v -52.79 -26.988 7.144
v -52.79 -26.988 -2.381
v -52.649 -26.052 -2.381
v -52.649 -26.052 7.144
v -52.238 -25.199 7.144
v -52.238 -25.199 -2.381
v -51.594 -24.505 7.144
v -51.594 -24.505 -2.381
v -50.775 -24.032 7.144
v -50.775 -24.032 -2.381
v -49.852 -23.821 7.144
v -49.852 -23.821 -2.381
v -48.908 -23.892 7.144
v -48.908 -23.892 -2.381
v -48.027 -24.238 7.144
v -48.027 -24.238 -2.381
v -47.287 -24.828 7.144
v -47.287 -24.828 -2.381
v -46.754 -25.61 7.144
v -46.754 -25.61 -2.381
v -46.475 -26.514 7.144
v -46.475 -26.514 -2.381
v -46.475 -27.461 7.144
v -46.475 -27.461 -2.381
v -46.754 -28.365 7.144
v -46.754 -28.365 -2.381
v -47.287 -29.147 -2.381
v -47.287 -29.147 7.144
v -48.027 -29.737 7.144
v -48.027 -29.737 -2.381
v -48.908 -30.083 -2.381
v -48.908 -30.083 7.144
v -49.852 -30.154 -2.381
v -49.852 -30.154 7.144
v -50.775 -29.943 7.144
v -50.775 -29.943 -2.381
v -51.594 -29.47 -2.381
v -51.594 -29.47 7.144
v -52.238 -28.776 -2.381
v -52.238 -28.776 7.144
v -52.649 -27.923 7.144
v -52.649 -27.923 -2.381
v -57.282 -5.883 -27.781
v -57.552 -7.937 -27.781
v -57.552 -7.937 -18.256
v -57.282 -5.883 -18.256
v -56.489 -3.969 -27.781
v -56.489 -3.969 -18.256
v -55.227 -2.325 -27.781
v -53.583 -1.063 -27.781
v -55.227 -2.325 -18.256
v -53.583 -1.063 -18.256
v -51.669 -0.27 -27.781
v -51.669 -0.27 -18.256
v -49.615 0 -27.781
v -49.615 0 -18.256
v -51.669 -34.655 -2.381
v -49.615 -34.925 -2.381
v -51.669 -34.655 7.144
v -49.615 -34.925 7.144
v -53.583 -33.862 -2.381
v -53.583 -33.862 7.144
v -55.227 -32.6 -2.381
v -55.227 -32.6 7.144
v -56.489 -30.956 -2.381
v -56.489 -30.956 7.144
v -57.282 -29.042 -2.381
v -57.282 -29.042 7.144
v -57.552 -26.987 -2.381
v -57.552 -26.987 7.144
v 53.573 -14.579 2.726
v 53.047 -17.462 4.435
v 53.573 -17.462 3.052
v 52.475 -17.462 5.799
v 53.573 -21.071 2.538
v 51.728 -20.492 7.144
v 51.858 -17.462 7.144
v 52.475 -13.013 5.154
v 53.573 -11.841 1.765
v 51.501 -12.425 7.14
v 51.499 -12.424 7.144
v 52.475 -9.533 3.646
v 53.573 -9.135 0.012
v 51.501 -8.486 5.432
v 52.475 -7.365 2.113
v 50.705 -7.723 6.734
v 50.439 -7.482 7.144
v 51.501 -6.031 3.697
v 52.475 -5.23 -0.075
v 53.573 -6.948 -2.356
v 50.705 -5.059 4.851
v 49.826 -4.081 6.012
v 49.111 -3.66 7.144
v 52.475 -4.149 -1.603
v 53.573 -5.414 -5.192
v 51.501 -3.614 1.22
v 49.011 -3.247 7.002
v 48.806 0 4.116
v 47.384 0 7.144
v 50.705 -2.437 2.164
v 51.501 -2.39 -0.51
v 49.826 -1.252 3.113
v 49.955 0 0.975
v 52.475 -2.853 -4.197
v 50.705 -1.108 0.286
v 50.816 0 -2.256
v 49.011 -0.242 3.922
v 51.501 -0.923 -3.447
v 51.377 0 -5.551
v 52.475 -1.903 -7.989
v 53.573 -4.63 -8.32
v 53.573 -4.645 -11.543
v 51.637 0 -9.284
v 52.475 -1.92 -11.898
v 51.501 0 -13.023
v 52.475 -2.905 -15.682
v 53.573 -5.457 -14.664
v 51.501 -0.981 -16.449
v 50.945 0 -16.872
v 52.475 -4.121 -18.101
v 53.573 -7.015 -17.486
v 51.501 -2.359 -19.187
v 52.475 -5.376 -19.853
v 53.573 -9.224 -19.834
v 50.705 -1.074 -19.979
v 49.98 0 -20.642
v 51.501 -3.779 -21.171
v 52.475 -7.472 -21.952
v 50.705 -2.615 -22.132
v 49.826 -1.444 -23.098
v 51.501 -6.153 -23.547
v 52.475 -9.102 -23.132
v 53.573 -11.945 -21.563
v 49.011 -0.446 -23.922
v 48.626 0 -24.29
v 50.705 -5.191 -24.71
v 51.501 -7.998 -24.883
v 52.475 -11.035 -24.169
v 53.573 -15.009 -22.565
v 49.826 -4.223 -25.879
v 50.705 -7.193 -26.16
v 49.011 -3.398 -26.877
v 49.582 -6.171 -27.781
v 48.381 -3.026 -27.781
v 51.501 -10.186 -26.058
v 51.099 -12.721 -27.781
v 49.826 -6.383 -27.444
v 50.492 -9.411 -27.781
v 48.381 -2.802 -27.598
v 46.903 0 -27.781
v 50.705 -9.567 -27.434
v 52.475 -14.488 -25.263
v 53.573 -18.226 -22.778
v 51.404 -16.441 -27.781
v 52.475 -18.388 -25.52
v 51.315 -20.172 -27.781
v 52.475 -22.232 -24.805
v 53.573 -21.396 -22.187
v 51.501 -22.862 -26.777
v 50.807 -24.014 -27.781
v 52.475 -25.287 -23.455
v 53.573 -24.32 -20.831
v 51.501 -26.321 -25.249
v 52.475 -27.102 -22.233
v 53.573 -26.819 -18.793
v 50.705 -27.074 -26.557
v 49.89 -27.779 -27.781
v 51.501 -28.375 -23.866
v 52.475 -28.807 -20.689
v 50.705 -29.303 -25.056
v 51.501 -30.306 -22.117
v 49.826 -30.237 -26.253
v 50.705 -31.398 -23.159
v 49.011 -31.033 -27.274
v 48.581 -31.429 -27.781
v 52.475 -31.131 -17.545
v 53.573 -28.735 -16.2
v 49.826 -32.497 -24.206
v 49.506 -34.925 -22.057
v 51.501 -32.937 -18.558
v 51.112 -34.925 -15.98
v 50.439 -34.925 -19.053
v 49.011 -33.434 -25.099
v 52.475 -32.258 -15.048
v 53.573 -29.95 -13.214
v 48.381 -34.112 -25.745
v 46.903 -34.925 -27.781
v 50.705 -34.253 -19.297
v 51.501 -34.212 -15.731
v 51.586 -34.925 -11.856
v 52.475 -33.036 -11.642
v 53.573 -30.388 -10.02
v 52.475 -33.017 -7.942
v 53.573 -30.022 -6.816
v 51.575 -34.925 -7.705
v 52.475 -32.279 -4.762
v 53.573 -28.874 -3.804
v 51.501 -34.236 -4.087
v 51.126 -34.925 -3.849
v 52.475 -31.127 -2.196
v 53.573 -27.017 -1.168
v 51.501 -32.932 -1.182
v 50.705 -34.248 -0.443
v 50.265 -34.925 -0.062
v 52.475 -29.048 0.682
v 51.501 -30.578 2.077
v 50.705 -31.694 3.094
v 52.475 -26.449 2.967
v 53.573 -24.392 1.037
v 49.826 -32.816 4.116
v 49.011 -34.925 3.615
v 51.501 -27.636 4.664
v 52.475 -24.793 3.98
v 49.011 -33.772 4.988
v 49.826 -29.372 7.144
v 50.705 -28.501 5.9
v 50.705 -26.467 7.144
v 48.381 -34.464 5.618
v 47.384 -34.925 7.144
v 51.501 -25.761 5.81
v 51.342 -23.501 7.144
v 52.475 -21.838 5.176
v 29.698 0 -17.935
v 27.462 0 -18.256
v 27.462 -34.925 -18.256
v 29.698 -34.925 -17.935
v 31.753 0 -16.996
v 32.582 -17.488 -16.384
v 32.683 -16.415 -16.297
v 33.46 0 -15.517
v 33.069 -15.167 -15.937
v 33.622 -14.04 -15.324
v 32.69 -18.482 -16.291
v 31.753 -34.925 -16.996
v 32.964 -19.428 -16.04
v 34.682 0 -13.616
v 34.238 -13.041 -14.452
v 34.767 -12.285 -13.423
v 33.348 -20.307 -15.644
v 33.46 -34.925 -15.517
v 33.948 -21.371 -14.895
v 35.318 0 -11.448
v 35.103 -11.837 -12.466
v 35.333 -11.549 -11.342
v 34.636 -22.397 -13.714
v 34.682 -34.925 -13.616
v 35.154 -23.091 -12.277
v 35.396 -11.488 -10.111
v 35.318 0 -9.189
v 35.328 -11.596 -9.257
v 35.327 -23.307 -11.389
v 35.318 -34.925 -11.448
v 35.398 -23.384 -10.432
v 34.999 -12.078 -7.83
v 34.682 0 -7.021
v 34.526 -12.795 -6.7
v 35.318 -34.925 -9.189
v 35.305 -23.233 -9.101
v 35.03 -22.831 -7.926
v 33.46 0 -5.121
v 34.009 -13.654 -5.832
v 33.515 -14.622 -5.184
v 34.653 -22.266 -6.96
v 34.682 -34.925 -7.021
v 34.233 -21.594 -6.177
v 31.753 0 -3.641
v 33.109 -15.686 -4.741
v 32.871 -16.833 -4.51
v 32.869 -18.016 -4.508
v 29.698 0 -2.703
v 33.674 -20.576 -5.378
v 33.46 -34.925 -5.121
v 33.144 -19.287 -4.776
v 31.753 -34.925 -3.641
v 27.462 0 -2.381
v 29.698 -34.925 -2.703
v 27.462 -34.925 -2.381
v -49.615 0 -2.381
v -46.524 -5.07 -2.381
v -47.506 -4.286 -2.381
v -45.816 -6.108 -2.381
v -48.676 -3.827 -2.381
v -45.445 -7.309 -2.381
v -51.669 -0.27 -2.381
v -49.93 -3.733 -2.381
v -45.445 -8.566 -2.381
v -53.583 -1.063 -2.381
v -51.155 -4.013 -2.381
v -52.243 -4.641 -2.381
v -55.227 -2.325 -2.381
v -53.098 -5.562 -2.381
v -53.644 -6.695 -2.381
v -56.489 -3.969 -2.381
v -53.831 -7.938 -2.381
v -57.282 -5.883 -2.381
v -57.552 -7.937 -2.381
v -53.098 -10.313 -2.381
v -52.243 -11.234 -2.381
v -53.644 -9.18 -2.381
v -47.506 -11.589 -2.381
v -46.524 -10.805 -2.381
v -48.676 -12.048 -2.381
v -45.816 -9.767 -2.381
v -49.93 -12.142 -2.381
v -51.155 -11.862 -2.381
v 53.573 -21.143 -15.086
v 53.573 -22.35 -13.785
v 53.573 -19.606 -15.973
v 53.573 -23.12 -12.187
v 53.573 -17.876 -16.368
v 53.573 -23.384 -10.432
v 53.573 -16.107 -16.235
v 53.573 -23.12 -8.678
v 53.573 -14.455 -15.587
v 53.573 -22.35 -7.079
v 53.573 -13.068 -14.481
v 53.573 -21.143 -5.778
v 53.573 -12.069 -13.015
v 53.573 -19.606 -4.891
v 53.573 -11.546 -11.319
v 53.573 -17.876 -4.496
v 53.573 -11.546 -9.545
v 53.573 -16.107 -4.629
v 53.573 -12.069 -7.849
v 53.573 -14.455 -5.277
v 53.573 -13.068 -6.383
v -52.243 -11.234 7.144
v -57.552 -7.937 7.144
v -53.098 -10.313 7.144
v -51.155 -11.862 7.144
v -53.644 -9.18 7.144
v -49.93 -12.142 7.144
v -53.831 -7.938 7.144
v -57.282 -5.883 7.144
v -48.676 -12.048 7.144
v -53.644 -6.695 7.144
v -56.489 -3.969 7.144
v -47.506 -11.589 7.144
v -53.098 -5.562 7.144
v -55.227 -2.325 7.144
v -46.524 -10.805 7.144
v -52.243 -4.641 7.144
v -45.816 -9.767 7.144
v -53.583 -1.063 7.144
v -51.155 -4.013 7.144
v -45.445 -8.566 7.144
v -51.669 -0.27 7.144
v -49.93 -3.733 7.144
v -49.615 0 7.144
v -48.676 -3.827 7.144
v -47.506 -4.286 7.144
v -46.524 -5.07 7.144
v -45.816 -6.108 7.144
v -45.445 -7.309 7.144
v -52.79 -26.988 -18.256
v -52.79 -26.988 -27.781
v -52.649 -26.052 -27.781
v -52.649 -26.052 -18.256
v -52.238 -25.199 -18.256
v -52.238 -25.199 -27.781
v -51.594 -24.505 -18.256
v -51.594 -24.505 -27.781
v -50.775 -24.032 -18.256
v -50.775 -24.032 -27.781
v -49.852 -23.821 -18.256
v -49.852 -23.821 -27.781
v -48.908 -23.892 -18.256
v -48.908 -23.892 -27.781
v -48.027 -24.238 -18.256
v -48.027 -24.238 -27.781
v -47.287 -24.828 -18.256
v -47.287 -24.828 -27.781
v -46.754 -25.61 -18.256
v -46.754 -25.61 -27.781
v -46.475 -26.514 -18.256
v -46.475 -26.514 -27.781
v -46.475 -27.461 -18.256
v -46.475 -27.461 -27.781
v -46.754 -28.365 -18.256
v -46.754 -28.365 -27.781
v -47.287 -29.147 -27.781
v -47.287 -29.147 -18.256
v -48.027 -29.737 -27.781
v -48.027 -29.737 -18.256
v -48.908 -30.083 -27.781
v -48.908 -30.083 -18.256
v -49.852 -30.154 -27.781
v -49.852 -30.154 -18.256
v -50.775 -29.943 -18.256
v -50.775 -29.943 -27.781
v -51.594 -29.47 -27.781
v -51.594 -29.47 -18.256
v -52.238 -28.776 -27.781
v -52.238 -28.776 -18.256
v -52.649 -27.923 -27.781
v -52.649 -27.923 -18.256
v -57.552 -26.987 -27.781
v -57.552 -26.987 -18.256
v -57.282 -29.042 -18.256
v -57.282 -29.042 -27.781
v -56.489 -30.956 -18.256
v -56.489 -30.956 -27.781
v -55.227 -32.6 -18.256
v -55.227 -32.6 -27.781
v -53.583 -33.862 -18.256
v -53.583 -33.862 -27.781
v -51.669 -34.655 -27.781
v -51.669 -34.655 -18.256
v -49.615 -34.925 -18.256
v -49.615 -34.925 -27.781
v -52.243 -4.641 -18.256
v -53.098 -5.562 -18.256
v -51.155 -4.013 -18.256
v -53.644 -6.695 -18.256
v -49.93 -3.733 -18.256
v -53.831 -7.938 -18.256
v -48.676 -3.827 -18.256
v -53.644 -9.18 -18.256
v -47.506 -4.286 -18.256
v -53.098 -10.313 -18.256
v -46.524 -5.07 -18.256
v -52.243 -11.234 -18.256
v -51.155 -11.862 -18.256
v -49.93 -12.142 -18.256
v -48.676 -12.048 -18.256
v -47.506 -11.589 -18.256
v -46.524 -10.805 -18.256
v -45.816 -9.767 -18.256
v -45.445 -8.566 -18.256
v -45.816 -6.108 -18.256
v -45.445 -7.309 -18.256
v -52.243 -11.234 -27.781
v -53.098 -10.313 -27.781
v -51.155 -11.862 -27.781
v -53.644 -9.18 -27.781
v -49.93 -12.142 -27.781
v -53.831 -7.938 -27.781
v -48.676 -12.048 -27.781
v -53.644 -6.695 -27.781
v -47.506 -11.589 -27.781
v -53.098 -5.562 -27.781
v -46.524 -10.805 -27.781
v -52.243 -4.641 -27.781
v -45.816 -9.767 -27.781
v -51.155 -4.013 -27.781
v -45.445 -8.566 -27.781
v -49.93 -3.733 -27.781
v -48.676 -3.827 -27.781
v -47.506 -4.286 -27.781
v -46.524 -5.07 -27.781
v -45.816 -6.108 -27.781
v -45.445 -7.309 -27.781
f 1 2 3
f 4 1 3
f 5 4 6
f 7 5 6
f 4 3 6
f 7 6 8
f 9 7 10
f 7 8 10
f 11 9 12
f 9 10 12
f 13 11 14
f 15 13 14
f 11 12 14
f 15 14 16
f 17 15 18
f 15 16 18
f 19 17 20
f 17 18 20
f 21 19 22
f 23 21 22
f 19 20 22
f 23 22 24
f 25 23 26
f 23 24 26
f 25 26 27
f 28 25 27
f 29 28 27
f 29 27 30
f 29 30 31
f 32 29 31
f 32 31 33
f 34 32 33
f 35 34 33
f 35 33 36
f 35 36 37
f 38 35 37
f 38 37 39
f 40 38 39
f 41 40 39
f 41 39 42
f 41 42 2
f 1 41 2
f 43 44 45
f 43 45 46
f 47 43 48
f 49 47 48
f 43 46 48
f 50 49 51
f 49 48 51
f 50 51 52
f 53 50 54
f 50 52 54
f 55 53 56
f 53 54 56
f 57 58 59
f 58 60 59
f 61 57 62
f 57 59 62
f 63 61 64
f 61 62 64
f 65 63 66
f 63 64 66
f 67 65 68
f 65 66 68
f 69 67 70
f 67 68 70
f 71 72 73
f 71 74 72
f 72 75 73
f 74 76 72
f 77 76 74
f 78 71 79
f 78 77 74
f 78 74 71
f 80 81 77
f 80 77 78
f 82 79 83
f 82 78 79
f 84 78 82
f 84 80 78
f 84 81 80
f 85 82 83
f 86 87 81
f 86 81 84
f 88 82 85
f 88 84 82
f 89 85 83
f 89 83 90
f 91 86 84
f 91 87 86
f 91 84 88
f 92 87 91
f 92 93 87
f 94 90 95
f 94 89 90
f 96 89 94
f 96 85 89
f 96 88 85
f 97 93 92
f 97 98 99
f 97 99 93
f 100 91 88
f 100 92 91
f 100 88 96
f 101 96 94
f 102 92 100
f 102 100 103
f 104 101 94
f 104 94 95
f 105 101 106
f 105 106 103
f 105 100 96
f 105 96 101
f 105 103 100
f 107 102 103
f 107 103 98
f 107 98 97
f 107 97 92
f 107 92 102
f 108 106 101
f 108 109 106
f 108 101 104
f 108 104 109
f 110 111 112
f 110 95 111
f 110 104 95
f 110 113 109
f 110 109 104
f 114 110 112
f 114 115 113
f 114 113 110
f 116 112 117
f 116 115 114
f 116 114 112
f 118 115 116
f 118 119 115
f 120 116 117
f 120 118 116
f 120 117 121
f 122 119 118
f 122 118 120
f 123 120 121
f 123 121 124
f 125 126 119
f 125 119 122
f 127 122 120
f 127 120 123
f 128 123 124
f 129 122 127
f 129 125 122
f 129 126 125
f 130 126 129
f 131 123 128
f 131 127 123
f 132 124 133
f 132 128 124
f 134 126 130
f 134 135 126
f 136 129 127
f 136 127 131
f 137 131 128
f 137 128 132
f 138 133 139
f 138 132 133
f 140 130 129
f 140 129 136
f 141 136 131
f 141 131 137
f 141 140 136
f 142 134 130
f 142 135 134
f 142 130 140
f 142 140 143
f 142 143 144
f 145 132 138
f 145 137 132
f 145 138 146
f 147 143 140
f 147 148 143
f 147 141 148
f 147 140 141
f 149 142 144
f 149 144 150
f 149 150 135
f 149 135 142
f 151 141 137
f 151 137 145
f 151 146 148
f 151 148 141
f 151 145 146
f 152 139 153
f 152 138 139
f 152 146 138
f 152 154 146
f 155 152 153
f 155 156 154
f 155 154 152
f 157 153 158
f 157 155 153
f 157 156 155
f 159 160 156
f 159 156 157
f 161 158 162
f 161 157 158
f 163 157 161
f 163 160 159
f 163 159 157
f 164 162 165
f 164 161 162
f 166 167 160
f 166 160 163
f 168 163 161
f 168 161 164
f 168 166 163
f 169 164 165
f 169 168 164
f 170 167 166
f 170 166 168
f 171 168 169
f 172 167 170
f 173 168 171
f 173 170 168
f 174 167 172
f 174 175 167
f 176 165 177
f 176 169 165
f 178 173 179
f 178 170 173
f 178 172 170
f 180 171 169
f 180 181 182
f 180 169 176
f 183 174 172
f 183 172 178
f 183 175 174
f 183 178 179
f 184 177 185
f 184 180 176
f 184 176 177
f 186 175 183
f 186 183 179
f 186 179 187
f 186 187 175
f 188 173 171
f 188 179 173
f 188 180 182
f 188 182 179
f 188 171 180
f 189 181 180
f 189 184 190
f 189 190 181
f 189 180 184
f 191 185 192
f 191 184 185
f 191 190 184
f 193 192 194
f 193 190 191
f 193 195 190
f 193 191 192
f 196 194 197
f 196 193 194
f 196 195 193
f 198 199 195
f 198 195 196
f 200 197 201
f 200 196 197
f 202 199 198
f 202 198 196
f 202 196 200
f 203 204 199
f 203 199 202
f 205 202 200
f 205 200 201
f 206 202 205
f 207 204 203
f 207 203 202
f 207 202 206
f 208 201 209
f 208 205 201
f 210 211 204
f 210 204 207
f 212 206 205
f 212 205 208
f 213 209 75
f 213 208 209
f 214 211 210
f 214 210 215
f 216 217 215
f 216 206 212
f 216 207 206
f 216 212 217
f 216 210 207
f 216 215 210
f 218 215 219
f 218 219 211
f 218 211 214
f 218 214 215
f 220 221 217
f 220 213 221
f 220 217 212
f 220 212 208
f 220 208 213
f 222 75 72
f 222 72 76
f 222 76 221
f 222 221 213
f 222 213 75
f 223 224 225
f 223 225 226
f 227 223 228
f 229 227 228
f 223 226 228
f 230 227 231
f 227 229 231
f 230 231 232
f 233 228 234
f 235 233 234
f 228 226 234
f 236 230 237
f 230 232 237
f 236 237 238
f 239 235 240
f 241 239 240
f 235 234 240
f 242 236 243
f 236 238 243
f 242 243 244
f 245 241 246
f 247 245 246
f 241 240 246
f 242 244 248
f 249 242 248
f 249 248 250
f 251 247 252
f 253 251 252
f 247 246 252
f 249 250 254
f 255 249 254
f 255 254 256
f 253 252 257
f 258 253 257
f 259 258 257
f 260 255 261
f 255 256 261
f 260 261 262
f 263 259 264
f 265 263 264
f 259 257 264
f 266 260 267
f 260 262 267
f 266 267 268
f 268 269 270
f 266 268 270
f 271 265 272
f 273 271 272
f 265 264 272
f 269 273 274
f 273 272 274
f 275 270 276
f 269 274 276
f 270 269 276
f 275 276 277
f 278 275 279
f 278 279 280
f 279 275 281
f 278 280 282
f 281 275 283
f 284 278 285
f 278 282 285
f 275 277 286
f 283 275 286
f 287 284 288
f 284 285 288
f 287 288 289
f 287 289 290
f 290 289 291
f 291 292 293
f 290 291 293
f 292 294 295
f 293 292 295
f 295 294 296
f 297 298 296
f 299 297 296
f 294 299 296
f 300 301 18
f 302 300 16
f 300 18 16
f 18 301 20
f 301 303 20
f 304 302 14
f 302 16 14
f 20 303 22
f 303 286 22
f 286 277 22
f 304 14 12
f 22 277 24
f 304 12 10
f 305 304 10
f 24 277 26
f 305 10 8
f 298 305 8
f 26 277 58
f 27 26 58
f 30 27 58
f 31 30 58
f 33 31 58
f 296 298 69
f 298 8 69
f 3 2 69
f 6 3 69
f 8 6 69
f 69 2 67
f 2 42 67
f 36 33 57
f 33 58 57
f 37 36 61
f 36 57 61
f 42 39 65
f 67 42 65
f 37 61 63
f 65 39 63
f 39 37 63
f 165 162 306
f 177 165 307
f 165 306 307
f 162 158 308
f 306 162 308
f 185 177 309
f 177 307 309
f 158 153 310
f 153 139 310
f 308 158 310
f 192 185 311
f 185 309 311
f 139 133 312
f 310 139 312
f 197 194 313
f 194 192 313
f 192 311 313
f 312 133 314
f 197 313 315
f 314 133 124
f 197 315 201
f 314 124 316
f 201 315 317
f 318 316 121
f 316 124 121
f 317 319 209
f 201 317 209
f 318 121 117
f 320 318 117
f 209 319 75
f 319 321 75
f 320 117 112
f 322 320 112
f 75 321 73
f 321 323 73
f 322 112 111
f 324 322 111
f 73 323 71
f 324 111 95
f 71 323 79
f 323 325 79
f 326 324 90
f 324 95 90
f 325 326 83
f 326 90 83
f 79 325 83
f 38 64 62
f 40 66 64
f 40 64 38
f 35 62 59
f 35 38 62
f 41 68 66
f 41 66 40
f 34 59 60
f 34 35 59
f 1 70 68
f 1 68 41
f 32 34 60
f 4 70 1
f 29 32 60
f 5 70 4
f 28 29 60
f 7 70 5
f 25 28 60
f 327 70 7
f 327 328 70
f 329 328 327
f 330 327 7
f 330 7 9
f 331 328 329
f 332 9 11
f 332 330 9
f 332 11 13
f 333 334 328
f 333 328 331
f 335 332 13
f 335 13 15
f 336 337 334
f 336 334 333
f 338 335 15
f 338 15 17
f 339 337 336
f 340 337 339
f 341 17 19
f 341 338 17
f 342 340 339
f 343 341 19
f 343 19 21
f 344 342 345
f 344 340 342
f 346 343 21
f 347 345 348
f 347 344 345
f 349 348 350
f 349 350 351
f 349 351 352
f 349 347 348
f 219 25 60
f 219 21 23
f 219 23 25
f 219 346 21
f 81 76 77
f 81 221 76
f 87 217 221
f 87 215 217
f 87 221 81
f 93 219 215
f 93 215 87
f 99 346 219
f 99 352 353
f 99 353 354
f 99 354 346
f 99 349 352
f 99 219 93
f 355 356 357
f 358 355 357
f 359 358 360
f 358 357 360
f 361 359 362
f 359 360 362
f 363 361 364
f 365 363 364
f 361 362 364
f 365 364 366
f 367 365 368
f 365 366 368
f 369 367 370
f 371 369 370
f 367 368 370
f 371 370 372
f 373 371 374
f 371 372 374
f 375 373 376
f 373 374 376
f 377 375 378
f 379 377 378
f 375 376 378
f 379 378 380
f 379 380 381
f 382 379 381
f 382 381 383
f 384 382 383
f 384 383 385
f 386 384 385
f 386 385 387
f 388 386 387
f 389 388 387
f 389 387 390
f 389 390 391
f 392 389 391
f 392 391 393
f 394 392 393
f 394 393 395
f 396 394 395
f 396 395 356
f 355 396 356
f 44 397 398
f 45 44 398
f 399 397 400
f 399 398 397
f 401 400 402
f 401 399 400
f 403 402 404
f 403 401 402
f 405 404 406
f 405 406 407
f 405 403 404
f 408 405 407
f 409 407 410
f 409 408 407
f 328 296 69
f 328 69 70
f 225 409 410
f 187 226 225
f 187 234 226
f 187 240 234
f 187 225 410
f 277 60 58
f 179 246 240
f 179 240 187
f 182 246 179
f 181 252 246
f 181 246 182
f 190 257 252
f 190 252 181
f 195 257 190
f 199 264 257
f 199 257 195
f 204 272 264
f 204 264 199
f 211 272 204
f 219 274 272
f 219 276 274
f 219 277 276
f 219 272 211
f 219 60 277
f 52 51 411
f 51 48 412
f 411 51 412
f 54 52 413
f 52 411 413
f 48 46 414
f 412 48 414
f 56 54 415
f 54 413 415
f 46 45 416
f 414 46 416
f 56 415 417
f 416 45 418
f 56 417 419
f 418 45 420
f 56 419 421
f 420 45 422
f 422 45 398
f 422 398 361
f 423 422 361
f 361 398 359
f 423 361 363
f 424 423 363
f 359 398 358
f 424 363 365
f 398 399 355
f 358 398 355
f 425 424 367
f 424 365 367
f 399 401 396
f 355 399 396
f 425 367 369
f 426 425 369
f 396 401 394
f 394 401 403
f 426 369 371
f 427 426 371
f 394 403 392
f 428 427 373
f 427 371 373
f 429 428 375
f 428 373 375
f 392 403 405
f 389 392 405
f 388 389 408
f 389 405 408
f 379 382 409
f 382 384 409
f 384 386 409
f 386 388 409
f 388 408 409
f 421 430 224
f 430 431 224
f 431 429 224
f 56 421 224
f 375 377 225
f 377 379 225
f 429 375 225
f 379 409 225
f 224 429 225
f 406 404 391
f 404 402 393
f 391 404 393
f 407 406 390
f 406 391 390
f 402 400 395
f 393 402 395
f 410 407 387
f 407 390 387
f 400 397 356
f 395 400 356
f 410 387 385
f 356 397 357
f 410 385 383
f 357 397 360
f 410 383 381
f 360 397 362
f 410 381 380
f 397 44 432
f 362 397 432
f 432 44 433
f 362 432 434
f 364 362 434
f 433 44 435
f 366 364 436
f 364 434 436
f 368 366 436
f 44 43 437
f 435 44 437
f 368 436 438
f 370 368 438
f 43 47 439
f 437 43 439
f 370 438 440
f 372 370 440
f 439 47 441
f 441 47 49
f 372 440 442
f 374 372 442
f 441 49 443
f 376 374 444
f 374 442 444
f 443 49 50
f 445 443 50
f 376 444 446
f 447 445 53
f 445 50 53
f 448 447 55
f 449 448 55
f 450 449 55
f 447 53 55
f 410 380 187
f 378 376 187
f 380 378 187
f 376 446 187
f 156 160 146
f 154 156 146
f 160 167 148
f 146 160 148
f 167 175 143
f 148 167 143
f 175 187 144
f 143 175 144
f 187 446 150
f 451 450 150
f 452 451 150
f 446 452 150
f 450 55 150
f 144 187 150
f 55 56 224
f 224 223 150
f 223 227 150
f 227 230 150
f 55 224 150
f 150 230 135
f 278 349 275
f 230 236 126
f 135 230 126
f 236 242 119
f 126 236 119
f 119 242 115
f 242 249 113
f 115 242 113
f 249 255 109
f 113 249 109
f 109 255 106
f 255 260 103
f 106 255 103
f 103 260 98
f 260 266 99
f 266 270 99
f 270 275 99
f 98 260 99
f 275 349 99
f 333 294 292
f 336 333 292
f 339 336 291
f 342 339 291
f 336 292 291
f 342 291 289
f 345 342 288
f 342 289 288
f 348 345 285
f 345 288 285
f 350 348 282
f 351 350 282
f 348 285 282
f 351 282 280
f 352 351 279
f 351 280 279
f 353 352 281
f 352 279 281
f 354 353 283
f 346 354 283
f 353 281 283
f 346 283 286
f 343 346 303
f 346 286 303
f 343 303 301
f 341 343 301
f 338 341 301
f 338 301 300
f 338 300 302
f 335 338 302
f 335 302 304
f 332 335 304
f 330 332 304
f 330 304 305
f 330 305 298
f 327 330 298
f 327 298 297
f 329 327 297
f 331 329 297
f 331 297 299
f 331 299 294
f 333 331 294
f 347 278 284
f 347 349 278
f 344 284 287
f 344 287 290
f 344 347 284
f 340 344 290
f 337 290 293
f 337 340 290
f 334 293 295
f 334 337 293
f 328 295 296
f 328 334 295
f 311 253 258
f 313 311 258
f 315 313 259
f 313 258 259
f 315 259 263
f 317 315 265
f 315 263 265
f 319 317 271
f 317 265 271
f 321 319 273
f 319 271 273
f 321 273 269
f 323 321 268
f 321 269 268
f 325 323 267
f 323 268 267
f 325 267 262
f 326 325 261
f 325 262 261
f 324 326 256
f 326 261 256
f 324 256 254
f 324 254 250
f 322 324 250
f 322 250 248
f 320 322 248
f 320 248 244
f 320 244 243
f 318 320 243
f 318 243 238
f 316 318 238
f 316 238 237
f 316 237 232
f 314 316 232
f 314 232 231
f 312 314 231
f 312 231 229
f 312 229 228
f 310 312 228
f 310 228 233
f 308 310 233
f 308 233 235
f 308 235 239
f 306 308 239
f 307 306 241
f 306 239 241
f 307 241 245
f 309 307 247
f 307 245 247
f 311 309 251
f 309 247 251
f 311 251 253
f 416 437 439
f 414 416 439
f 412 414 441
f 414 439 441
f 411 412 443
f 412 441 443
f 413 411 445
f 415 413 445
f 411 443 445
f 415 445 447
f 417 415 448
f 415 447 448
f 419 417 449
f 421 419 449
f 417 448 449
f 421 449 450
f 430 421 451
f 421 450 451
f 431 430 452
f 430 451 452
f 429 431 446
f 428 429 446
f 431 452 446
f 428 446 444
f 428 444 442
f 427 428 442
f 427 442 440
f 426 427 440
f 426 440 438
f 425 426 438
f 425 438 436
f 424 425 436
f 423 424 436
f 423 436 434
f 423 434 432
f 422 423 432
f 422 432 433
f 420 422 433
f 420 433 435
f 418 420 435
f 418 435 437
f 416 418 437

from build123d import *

# Parameters (mm, degrees)
F0_W     = 111.125
F0_H     = 34.925
F1_DEPTH = 34.925
F3_DEPTH = 34.925
F8_D     = 8.4328
F9_D     = 6.35
F10_R    = 7.9375
F12_D    = 11.90498


with BuildPart() as f1:
    # F0 (on Front) → F1 (new body)
    with BuildSketch(Plane.XZ):
        with Locations((-1.9895918667, -10.3187973859)):
            Rectangle(F0_W, F0_H)
    extrude(amount=F1_DEPTH)

    # F2 (on face) → F3 (cut)
    with BuildSketch(Plane.XZ.offset(34.925)):
        with BuildLine():
            Line((27.4617081333, -2.3812973859), (-57.5520918667, -2.3812973859))
            Line((-57.5520918667, -2.3812973859), (-57.5520918667, -18.2562973859))
            Line((-57.5520918667, -18.2562973859), (27.4617081333, -18.2562973859))
            ThreePointArc((27.4617081333, -18.2562973859), (35.3992081333, -10.3187973859), (27.4617081333, -2.3812973859))
        make_face()
    extrude(amount=-F3_DEPTH, mode=Mode.SUBTRACT)

    # F5 (on mid) → F6 (revolve, intersect)
    with BuildSketch(Plane.XZ.offset(17.4625)):
        with BuildLine():
            Line((-68.8055506017, -9.8742973859), (56.133069098, -9.8742973859))
            ThreePointArc((56.133069098, -9.8742973859), (52.8530157752, 4.9131087603), (44.7397269309, 17.70375669))
            Line((44.7397269309, 17.70375669), (-68.8055506017, 17.70375669))
            Line((-68.8055506017, 17.70375669), (-68.8055506017, -9.8742973859))
        make_face()
    revolve(axis=Axis((-6.3362407519, -17.4625, -9.8742973859), (-1, 0, 0)), mode=Mode.INTERSECT)

    # F8 (through all)
    with Locations(Plane.XY.offset(7.1437026141)):
        with Locations((-49.6145918667, -7.9375)):
            Hole(F8_D / 2)

    # F9 (through all)
    with Locations(Plane.XY.offset(7.1437026141)):
        with Locations((-49.6145918667, -26.9875)):
            Hole(F9_D / 2)

    # F10
    f10_edges = [f1.edges().sort_by_distance(p)[0] for p in [
        (-57.552092, 0, 2.381203),
        (-57.552092, -34.925, 2.381203),
        (-57.552092, 0, -23.018797),
        (-57.552092, -34.925, -23.018797),
    ]]
    fillet(f10_edges, radius=F10_R)

    # F12 (through all)
    with Locations(Plane.YZ.offset(53.5729081333)):
        with Locations((-17.4315758049, -10.4321427643)):
            Hole(F12_D / 2)


solid = f1.part
